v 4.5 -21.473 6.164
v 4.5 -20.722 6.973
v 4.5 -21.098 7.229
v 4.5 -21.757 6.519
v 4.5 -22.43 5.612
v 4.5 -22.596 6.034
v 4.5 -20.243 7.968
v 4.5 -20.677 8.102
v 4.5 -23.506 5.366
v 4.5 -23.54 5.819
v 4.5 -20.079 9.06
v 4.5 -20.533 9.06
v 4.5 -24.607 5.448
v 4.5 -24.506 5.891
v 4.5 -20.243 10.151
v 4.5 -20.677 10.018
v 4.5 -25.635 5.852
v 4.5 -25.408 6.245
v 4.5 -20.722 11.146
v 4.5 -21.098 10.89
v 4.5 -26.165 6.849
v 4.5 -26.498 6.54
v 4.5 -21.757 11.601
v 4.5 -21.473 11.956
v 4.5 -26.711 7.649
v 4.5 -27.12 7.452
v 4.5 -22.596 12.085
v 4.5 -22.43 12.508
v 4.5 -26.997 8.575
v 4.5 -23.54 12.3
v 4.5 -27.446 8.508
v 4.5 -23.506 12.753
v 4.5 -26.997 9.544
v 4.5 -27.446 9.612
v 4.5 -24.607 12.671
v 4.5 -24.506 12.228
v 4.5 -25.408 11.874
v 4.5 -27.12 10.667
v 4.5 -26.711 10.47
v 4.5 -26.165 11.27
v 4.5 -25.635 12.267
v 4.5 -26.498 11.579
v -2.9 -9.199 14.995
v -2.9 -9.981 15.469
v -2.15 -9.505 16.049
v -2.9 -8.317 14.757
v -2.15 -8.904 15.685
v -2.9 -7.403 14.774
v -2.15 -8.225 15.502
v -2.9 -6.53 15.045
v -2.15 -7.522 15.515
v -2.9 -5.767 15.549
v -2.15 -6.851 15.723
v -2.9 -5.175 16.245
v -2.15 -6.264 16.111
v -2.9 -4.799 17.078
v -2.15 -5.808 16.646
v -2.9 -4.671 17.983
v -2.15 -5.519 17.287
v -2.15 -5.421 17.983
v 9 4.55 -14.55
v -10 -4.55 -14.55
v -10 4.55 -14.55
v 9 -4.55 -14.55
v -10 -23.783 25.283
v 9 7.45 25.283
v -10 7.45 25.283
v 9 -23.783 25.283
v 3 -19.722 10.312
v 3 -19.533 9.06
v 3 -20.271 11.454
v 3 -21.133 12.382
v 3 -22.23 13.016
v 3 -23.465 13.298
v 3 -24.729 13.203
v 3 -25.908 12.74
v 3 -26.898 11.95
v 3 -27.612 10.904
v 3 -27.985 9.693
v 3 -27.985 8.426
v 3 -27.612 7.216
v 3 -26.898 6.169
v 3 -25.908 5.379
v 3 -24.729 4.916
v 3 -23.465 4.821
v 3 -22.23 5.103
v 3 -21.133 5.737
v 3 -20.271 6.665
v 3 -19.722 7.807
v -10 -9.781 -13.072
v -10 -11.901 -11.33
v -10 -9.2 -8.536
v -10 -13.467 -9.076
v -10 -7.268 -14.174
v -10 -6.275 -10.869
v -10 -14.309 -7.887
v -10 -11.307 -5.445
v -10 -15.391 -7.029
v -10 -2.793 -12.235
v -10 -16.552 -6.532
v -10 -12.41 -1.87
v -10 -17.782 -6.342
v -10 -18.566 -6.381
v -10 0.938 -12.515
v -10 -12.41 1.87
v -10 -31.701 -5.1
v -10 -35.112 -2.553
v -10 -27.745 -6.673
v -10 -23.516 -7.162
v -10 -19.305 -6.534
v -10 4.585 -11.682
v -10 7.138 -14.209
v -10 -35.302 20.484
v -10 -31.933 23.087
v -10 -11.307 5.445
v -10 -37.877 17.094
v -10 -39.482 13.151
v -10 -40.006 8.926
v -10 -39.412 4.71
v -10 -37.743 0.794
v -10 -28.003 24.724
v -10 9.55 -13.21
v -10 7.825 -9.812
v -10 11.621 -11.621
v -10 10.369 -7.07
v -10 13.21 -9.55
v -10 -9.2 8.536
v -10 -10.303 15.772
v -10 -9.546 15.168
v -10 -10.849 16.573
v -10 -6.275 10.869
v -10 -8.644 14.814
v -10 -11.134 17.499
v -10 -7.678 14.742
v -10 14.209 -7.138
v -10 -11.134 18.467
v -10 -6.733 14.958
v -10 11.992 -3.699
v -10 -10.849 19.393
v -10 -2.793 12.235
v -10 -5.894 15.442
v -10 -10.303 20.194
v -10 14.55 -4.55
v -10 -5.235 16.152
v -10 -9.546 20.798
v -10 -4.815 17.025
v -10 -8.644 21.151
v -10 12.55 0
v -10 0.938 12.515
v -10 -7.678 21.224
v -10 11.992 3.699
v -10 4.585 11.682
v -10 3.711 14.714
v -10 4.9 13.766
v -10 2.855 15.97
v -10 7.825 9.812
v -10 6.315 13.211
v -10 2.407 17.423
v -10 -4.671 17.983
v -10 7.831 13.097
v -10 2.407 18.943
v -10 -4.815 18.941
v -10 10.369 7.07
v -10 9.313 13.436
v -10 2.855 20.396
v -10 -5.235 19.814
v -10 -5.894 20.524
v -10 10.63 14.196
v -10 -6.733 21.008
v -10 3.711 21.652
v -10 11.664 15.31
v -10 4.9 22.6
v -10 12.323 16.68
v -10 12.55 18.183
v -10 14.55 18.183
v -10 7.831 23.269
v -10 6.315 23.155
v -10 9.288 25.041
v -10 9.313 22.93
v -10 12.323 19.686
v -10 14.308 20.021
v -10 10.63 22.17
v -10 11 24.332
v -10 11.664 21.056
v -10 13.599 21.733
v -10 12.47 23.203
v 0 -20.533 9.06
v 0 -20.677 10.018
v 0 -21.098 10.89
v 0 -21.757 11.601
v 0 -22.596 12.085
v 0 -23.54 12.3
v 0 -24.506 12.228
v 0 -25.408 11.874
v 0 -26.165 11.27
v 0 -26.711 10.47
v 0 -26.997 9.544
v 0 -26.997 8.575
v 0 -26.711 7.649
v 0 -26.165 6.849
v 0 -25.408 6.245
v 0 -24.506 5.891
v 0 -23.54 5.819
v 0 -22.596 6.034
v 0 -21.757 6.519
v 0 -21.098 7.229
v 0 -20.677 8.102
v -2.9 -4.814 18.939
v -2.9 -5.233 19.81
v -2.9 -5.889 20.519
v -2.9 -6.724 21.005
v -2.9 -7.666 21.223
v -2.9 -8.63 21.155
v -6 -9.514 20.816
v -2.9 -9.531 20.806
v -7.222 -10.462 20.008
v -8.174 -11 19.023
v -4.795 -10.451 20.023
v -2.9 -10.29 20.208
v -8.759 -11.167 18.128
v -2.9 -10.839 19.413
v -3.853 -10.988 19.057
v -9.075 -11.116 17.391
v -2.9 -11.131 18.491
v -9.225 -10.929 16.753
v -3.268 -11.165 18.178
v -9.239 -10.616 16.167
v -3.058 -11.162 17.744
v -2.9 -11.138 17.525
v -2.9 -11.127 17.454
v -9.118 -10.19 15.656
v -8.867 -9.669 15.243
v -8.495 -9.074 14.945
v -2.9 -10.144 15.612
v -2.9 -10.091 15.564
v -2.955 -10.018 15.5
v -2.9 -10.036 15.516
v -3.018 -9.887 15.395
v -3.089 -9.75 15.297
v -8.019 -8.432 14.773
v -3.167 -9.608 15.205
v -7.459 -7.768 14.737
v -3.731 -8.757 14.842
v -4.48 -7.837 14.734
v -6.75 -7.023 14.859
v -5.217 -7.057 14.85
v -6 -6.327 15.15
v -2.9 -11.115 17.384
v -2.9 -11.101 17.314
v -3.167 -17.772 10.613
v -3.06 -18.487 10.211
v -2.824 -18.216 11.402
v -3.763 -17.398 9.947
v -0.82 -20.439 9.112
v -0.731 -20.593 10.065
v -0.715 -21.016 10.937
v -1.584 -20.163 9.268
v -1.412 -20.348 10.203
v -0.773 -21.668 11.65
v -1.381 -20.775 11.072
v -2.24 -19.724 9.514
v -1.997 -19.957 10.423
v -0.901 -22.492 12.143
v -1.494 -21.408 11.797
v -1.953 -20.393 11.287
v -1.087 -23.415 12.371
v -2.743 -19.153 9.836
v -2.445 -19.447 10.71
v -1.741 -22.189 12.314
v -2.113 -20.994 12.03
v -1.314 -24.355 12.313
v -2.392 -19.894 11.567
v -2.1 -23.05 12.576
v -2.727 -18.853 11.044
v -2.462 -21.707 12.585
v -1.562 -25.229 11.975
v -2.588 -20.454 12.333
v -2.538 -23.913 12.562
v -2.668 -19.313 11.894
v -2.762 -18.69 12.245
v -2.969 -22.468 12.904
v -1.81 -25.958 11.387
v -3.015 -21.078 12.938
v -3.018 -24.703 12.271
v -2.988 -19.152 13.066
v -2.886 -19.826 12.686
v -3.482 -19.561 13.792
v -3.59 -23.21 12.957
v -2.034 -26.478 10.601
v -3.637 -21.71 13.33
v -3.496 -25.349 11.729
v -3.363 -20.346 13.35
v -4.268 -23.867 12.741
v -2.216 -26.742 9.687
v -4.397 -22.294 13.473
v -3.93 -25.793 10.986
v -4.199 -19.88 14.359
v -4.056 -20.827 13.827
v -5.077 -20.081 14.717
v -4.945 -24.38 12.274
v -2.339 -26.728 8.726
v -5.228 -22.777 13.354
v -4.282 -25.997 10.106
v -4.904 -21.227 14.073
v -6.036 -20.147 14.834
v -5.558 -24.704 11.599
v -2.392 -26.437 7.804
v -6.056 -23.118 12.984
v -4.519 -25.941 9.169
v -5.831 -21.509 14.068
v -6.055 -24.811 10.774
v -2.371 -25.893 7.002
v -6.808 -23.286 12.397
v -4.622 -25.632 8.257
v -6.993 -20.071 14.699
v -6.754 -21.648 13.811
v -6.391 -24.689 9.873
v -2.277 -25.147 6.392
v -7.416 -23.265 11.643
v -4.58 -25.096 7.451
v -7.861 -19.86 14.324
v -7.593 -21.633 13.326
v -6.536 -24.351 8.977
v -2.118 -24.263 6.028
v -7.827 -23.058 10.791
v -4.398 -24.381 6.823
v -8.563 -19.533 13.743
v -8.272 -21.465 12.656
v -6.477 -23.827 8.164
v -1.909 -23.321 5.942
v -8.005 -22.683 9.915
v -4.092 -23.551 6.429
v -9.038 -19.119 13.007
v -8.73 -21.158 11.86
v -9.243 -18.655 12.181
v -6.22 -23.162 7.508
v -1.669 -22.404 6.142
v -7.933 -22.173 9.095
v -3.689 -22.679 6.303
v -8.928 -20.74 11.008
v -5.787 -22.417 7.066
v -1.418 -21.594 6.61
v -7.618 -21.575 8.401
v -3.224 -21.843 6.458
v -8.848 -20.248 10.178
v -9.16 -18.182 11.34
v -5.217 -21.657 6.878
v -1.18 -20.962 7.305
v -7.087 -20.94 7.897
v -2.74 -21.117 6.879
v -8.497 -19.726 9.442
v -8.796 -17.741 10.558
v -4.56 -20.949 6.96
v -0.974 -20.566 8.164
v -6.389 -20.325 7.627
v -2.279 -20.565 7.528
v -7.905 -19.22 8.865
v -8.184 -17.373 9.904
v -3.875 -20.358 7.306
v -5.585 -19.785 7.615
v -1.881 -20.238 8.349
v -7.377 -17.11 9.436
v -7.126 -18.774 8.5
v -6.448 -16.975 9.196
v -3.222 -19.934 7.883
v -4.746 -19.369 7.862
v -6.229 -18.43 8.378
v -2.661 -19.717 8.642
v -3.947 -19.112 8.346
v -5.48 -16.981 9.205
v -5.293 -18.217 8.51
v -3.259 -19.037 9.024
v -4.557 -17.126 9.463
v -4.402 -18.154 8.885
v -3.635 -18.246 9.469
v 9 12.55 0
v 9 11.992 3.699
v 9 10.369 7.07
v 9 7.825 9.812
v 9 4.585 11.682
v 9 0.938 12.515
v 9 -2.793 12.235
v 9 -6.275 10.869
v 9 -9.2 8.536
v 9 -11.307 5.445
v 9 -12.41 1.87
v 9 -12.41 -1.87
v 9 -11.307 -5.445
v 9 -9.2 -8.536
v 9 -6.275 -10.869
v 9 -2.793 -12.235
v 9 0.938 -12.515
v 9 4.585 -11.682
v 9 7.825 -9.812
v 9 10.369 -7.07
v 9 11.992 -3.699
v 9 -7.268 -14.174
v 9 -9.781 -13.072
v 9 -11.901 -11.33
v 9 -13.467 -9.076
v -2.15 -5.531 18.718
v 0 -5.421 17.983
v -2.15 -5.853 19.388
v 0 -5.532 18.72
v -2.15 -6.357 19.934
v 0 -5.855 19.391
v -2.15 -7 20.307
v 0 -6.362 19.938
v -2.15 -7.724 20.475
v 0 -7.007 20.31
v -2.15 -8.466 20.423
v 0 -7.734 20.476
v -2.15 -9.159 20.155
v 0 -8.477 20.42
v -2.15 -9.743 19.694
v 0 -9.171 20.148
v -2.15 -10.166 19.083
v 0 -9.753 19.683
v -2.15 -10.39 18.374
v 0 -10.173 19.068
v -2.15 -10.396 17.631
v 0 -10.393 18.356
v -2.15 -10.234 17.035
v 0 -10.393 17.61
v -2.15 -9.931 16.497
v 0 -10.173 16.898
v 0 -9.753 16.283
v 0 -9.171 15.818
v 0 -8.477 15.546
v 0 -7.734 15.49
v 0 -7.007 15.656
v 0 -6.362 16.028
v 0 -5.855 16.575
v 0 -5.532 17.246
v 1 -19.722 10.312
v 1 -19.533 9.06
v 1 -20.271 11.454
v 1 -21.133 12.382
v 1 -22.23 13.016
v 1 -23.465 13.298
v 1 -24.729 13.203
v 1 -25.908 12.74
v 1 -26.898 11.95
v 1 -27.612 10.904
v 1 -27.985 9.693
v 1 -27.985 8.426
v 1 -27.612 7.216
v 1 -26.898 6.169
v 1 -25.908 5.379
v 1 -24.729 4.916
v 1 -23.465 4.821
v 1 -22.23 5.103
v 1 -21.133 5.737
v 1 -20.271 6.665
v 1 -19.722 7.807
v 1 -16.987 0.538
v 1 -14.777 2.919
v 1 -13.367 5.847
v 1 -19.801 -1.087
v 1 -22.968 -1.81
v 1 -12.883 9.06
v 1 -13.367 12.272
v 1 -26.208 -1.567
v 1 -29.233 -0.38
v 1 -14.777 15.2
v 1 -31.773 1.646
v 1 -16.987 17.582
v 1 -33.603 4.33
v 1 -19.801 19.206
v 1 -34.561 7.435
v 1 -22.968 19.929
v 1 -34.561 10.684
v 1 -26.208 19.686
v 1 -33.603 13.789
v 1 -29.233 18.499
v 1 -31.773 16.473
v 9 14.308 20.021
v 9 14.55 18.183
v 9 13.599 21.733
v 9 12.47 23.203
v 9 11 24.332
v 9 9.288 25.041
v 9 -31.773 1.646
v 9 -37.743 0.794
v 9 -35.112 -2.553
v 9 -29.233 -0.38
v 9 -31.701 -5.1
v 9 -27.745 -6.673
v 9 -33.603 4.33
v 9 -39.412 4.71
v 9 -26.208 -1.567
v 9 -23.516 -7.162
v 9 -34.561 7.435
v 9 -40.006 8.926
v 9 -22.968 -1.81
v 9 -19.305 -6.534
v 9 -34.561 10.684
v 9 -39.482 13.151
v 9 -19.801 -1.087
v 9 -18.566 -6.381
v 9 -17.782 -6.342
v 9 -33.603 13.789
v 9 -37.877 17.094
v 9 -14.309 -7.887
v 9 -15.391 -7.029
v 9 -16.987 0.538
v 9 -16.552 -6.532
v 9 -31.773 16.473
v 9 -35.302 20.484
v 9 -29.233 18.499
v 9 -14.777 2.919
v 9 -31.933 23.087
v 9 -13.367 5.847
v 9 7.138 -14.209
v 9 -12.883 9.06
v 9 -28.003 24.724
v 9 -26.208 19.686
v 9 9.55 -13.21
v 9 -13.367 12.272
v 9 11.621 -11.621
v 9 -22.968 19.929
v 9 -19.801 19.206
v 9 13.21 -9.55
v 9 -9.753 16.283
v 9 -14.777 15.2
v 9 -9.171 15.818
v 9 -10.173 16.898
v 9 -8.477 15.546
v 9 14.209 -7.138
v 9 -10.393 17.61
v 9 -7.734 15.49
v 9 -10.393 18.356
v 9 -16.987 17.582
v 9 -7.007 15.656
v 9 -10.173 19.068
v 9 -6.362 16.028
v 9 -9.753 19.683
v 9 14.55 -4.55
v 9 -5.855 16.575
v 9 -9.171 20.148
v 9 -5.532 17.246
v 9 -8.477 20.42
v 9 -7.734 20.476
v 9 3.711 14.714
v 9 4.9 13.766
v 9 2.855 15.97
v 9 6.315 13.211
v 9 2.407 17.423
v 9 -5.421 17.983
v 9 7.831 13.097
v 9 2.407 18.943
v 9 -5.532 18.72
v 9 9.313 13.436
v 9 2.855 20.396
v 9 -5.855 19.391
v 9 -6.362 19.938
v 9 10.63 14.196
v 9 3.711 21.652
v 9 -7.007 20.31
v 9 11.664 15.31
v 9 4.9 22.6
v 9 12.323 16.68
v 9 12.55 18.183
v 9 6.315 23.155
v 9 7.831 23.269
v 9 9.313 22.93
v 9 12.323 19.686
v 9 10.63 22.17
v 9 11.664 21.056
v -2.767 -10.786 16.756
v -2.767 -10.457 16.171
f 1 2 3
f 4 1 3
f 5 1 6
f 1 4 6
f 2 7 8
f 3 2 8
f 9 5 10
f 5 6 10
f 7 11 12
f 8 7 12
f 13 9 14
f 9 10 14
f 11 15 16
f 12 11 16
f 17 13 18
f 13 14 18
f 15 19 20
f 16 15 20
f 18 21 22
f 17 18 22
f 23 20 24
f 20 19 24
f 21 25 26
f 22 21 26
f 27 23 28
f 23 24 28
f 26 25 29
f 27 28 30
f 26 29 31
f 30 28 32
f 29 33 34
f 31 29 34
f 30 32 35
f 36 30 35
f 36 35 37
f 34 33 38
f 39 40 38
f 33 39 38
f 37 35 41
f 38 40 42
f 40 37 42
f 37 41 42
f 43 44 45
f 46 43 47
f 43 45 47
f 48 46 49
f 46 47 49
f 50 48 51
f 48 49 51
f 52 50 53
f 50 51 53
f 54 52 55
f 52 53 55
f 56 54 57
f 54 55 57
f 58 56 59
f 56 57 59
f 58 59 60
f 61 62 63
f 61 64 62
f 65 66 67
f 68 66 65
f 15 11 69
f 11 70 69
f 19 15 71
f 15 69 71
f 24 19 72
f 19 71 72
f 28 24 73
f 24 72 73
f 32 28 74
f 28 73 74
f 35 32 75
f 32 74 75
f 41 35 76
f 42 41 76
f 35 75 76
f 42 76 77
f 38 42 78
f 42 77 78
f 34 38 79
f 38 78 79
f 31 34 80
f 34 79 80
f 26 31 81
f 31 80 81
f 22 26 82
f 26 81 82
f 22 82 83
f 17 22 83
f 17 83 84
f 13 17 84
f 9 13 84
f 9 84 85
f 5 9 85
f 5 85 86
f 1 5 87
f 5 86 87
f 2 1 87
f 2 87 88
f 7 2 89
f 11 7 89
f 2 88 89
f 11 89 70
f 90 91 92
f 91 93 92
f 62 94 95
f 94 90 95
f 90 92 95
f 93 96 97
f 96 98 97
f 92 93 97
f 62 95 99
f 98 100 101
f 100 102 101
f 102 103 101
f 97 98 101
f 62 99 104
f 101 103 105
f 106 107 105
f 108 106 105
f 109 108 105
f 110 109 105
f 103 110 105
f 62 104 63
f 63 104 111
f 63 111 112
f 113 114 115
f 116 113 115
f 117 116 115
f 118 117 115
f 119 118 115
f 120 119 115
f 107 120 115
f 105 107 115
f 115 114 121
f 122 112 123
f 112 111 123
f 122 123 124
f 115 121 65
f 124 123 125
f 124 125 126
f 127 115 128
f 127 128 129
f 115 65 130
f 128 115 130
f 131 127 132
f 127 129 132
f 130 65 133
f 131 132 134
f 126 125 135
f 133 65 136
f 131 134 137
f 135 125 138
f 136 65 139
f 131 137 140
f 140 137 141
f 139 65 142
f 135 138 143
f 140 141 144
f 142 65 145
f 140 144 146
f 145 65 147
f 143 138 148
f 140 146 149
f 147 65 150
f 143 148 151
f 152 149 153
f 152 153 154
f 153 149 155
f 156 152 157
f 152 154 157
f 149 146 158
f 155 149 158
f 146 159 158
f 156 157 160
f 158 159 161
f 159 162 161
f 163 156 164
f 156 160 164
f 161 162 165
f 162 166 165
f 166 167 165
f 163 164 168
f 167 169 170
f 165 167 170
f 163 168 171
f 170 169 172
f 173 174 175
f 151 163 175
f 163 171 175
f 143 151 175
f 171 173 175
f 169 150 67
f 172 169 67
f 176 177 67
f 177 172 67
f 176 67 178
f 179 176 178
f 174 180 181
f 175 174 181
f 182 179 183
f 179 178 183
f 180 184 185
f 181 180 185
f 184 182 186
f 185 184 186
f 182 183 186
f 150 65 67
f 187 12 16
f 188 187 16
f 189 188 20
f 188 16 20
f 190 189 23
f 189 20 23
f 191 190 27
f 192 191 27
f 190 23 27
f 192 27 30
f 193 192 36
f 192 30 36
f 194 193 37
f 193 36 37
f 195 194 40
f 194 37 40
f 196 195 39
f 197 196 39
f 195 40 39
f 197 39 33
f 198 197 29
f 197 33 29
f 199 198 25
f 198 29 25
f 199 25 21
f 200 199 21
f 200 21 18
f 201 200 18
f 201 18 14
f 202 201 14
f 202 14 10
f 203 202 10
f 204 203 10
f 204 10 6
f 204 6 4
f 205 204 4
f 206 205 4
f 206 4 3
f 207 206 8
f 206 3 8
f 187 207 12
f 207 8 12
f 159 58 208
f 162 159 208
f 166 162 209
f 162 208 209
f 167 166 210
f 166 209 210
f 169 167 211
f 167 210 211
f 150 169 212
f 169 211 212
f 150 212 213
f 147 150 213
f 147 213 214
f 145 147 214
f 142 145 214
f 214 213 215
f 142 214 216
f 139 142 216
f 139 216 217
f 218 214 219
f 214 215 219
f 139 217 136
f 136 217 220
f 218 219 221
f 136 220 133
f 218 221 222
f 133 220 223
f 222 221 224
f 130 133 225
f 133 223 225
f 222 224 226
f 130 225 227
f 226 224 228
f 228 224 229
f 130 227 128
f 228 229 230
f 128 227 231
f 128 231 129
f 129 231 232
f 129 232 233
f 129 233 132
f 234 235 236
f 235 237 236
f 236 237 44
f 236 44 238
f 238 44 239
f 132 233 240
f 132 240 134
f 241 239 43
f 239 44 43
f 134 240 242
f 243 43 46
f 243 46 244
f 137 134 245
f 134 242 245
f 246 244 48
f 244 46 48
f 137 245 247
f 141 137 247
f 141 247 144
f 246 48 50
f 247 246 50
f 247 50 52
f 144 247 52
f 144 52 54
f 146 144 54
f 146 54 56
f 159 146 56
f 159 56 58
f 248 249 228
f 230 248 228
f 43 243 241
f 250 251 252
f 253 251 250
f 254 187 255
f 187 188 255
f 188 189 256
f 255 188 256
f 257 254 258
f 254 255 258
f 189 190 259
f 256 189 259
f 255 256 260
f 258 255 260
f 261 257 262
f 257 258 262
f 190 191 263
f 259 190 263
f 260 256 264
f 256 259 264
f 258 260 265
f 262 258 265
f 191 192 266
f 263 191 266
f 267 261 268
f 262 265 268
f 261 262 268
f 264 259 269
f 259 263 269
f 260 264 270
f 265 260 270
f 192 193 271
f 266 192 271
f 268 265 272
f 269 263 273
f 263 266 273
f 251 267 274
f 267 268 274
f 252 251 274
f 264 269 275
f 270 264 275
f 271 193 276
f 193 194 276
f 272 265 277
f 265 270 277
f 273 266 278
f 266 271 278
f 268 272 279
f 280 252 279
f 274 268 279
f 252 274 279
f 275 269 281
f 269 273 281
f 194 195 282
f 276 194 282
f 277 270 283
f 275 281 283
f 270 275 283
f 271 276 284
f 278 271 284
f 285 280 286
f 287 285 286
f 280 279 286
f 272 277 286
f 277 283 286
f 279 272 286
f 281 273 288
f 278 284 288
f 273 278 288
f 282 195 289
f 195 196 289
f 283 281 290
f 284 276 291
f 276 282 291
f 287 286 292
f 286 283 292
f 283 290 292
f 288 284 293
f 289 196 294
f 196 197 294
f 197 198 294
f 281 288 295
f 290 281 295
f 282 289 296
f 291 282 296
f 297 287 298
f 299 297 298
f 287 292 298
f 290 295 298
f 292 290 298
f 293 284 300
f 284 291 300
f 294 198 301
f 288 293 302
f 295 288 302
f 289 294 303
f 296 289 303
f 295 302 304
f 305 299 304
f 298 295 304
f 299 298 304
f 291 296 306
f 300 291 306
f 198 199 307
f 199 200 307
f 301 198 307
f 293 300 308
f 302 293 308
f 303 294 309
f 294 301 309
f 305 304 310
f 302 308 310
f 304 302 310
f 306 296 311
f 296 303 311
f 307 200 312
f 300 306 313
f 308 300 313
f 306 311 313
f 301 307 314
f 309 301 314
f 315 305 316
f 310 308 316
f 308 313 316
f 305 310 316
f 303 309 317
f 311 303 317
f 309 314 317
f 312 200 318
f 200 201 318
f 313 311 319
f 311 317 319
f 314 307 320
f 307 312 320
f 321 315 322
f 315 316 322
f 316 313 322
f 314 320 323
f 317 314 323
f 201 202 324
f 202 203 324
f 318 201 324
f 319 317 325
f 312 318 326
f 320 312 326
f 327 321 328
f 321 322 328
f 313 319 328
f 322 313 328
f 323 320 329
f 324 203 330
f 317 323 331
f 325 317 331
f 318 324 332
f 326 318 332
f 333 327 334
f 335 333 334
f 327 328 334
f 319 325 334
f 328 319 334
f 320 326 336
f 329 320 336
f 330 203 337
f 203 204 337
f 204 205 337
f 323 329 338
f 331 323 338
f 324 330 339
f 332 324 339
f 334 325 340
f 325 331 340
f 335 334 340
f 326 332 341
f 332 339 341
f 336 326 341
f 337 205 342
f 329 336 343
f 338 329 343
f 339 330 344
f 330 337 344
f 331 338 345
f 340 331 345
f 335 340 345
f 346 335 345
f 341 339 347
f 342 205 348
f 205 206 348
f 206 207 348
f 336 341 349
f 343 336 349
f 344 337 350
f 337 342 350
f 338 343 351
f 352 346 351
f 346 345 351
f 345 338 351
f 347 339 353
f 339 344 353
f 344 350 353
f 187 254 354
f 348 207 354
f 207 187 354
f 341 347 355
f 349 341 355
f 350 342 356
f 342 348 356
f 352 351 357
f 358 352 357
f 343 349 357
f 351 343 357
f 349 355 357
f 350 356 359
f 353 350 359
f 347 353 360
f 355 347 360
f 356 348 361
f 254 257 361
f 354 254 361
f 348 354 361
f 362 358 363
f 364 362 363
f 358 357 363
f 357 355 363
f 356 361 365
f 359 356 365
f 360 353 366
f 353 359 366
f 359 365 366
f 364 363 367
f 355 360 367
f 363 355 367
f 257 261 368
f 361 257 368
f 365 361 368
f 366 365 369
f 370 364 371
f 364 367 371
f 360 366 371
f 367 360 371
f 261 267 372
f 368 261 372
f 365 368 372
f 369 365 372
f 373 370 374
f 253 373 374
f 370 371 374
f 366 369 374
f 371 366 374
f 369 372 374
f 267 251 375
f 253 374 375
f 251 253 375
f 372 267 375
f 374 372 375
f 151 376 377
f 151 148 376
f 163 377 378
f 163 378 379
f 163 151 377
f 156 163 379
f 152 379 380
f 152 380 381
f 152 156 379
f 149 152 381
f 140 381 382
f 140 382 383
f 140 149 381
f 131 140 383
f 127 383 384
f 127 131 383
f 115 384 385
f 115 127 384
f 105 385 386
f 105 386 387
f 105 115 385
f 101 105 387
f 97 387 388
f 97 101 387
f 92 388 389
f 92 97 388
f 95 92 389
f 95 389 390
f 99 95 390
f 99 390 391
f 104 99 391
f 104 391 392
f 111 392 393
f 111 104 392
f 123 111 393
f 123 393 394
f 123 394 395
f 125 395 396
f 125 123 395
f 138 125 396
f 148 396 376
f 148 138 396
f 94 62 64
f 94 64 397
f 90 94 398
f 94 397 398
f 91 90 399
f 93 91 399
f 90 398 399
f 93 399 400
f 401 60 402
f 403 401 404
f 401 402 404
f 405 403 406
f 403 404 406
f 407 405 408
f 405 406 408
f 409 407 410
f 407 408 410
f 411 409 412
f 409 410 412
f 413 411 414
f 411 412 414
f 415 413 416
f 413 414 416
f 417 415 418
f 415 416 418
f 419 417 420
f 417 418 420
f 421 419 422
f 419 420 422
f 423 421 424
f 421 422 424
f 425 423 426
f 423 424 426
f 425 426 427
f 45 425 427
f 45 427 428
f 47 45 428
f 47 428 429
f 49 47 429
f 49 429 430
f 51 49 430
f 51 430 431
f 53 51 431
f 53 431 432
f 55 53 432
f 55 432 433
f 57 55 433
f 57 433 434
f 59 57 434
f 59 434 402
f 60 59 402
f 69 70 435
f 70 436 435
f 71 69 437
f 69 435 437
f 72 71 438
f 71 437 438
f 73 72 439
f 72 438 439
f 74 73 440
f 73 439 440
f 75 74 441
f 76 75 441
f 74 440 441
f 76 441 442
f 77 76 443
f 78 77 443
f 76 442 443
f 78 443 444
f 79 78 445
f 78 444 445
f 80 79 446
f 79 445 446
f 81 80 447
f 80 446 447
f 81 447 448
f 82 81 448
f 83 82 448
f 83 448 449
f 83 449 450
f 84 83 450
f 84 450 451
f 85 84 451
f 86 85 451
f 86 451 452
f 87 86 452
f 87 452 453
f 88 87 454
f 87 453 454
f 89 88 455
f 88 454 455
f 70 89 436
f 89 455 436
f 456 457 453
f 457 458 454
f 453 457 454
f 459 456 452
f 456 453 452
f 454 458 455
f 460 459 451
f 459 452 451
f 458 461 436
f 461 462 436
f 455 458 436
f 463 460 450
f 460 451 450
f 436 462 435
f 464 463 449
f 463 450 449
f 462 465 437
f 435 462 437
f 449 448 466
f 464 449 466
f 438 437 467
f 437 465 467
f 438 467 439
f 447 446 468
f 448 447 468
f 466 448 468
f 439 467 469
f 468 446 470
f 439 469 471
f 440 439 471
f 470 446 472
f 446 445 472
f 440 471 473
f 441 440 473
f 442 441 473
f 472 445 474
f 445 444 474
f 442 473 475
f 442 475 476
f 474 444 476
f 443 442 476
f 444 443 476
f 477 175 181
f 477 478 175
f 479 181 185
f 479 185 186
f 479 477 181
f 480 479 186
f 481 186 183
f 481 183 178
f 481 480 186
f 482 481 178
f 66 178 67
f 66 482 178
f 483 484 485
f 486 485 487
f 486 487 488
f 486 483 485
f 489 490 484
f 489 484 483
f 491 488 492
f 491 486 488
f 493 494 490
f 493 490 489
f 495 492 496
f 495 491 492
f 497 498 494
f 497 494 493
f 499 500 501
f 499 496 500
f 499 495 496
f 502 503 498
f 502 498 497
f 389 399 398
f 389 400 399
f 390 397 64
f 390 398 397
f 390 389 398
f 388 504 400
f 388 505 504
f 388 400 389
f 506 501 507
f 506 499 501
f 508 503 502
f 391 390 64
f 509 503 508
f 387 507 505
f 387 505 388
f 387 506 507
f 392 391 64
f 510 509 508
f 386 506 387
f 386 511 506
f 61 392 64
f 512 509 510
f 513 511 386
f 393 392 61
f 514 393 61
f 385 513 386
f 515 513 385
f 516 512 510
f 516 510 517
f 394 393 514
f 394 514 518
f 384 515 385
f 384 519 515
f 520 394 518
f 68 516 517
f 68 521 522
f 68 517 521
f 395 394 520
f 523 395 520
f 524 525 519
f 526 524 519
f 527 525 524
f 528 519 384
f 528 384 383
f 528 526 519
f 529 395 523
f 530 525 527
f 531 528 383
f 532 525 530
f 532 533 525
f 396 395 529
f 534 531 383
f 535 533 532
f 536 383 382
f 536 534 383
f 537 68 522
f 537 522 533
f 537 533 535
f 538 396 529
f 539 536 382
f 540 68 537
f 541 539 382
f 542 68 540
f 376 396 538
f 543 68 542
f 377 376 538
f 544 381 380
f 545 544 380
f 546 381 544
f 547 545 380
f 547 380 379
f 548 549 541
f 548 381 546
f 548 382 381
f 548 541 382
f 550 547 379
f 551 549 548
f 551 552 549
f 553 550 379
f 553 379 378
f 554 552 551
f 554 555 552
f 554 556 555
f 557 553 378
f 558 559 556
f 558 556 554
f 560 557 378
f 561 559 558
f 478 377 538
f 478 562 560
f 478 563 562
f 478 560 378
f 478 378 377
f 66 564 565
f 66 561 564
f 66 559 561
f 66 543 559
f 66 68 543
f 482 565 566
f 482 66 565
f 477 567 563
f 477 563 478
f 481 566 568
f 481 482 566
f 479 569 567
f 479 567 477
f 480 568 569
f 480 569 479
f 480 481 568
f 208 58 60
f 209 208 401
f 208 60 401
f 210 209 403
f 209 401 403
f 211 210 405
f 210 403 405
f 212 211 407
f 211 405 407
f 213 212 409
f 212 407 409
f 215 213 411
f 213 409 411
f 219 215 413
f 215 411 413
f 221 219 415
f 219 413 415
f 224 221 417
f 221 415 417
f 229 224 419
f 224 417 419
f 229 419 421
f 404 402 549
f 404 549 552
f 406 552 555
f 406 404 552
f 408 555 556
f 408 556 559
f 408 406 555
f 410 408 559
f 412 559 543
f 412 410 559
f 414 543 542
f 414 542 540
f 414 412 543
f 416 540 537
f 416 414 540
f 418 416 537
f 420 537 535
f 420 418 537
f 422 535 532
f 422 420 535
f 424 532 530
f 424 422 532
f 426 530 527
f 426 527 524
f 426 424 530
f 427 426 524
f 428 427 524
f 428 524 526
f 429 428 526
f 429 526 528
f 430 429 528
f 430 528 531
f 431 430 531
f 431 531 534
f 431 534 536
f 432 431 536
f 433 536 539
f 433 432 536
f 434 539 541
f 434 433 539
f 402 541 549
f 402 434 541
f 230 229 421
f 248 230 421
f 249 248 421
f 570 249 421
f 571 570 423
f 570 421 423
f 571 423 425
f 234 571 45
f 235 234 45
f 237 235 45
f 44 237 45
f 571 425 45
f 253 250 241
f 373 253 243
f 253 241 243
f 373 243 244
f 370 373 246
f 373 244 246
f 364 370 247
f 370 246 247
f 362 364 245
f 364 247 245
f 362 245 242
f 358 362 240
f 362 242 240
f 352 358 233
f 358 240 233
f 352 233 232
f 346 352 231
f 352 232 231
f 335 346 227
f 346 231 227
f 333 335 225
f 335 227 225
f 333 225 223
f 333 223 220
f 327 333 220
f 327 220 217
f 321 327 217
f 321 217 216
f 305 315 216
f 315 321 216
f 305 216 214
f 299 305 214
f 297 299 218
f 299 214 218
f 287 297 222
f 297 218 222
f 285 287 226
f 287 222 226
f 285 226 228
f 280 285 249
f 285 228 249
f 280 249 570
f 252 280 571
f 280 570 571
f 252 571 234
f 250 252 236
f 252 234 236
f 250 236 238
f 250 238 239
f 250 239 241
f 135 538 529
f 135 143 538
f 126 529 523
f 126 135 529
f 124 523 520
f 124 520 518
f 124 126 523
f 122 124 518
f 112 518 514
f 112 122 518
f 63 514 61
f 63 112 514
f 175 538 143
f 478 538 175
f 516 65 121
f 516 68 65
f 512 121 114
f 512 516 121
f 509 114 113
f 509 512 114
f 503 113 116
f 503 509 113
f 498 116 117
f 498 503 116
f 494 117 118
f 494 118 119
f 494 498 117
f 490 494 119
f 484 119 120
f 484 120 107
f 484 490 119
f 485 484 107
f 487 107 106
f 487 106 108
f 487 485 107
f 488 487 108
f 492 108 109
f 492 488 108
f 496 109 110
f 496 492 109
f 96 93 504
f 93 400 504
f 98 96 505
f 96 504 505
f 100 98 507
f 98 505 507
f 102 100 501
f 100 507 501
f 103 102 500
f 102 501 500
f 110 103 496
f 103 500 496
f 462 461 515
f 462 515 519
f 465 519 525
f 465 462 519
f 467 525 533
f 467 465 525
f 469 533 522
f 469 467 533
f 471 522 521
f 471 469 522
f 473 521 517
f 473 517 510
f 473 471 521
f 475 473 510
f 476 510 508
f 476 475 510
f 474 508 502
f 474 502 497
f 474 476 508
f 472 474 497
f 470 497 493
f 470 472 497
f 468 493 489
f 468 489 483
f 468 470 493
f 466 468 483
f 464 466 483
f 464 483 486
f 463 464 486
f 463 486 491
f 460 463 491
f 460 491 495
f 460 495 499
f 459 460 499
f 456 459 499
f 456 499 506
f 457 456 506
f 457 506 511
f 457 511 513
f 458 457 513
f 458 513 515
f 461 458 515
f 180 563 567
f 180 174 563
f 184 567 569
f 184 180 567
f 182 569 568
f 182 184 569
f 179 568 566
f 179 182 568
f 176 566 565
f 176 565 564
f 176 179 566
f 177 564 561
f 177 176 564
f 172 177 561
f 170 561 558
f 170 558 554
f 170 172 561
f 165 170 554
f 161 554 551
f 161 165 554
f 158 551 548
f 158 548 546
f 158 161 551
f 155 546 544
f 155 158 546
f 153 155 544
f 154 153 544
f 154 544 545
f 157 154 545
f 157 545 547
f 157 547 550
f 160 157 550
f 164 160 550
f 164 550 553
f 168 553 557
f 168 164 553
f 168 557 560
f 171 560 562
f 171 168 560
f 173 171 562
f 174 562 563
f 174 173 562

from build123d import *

# Parameters (mm, degrees)
F0_R          = 12.55
F0_R_2        = 10.9
F0_R_3        = 3.25
F0_R_4        = 5.1
F0_R_5        = 2.5
F1_DEPTH      = 9
F2_DEPTH      = 10
F3_R          = 10
F4_R          = 5
F11_DEPTH     = 2.9
F10_R         = 3.25
F13_T4_ANGLE  = 230.6618088311
F13_S5_R      = 3.25
F13_T6_DEPTH  = 6
F13_T10_ANGLE = 171.9012593912
F13_S11_R     = 3.25
F13_T12_DEPTH = 5


# Not quite as in the source:
# - a fillet or chamfer that OpenCascade refuses, or shapes differently, is made with other operations: its cross-section is extruded or revolved along the edge and cut away or added


with BuildPart() as f1:
    # F0 (on Right) → F1 (new body)
    with BuildSketch(Plane.YZ):
        with BuildLine():
            Line((7.45, 25.2829590551), (-23.7829060836, 25.2829590551))
            ThreePointArc((-23.7829060836, 25.2829590551), (-39.2686382031, 4.2232189691), (-14.55, -4.280278967))
            Line((-14.55, -4.280278967), (-14.55, -14.55))
            Line((-14.55, -14.55), (14.55, -14.55))
            Line((14.55, -14.55), (14.55, 18.1829590551))
            ThreePointArc((14.55, 18.1829590551), (12.4704581464, 23.2034172015), (7.45, 25.2829590551))
        make_face()
        Circle(F0_R, mode=Mode.SUBTRACT)
        with Locations((-23.7829060836, 9.059573843)):
            Circle(F0_R_2, mode=Mode.SUBTRACT)
        with Locations((-7.9205860656, 17.9829590551)):
            Circle(F0_R_3, mode=Mode.SUBTRACT)
        with Locations((7.45, 18.1829590551)):
            Circle(F0_R_4, mode=Mode.SUBTRACT)
        with Locations((-7.9205860656, 17.9829590551)):
            Circle(F0_R_3)
        with Locations((-7.9205860656, 17.9829590551)):
            Circle(F0_R_5, mode=Mode.SUBTRACT)
    extrude(amount=F1_DEPTH)

    # F0 (on Right) → F2 (join)
    with BuildSketch(Plane.YZ):
        with BuildLine():
            Line((7.45, 25.2829590551), (-23.7829060836, 25.2829590551))
            ThreePointArc((-23.7829060836, 25.2829590551), (-39.2686382031, 4.2232189691), (-14.55, -4.280278967))
            Line((-14.55, -4.280278967), (-14.55, -14.55))
            Line((-14.55, -14.55), (14.55, -14.55))
            Line((14.55, -14.55), (14.55, 18.1829590551))
            ThreePointArc((14.55, 18.1829590551), (12.4704581464, 23.2034172015), (7.45, 25.2829590551))
        make_face()
        Circle(F0_R, mode=Mode.SUBTRACT)
        with Locations((-23.7829060836, 9.059573843)):
            Circle(F0_R_2, mode=Mode.SUBTRACT)
        with Locations((-7.9205860656, 17.9829590551)):
            Circle(F0_R_3, mode=Mode.SUBTRACT)
        with Locations((7.45, 18.1829590551)):
            Circle(F0_R_4, mode=Mode.SUBTRACT)
        with Locations((-23.7829060836, 9.059573843)):
            Circle(F0_R_2)
    extrude(amount=-F2_DEPTH)

    # F3
    f3_edges = [f1.edges().sort_by_distance(p)[0] for p in [
        (-0.5, -23.782906, 25.282959),
        (-0.5, 14.55, 18.182959),
        (-0.5, 7.45, 25.282959),
        (-0.5, -14.55, -14.55),
        (-0.5, 14.55, -14.55),
    ]]
    fillet(f3_edges, radius=F3_R)

    # F4
    f4_edges = [f1.edges().sort_by_distance(p)[0] for p in [
        (-0.5, -14.55, -4.280279),
    ]]
    fillet(f4_edges, radius=F4_R)

    # F7 (on plane+point) → F8 (revolve)
    with BuildSketch(Plane.XY.offset(9.059573843)):
        Polygon((1, -12.7829060836), (0, -12.7829060836), (0, -20.5329060836), (4.5, -20.5329060836), (4.5, -20.078861435), (3, -19.5329060836), (1, -19.5329060836), align=None)
    revolve(axis=Axis((4.5, -23.7829060836, 9.059573843), (1, 0, 0)))

    # F0 (on Right) → F11 (join)
    with BuildSketch(Plane.YZ):
        with Locations((-7.9205860656, 17.9829590551)):
            Circle(F0_R_3)
        with Locations((-7.9205860656, 17.9829590551)):
            Circle(F0_R_5, mode=Mode.SUBTRACT)
    extrude(amount=-F11_DEPTH)

    # F12: sweep along a path in F9
    with BuildLine(Plane(origin=(0, -9.5885144747, 17.044662029), x_dir=(1, 0, 0), z_dir=(0, 0.4902958908, -0.8715560449))) as f12_path:
        ThreePointArc((0, 16.2862637363), (-4.2426406871, 14.5289044234), (-6, 10.2862637363))
        Line((-6, 10.2862637363), (-6, -1.9137362637))
    # F10 (on face) → F12 (sweep, cut)
    with BuildSketch(Plane.YZ):
        with Locations((-23.7829060836, 9.059573843)):
            Circle(F10_R)
    sweep(path=f12_path.line, mode=Mode.SUBTRACT)

    # F13: chamfer of 0.75 on 1 edges, made by hand


with BuildPart() as f13_tool2:
    # F13_s3 → F13_t4 (revolve)
    with BuildSketch(Plane.XY.offset(17.9829590551)):
        Polygon((-2.9, -4.6705860656), (-2.15, -5.4205860656), (-2.9, -5.4205860656), align=None)
    revolve(axis=Axis((-2.9, -7.9205860656, 17.9829590551), (1, 0, 0)), revolution_arc=F13_T4_ANGLE)

    # F13_s5 → F13_t6 (intersect, symmetric)
    with BuildSketch(Plane.YZ.offset(-2.5)):
        with Locations((-7.9205860656, 17.9829590551)):
            Circle(F13_S5_R)
    extrude(amount=F13_T6_DEPTH, both=True, mode=Mode.INTERSECT)


with BuildPart() as f1_1:
    add(f1.part)

    # F13_t1: cut F13_tool2
    add(f13_tool2.part, mode=Mode.SUBTRACT)


with BuildPart() as f13_tool8:
    # F13_s9 → F13_t10 (revolve)
    with BuildSketch(Plane(origin=(0, -2.6653633076, 18.7307701592), x_dir=(1, 0, 0), z_dir=(0, -0.1408794707, 0.9900267546))):
        Polygon((-2.9, -8.558162364), (-2.15, -7.808162364), (-2.9, -7.808162364), align=None)
    revolve(axis=Axis((-2.9, -7.9205860656, 17.9829590551), (1, 0, 0)), revolution_arc=F13_T10_ANGLE)

    # F13_s11 → F13_t12 (intersect, symmetric)
    with BuildSketch(Plane.YZ.offset(-2.5)):
        with Locations((-7.9205860656, 17.9829590551)):
            Circle(F13_S11_R)
    extrude(amount=F13_T12_DEPTH, both=True, mode=Mode.INTERSECT)


with BuildPart() as f1_2:
    add(f1_1.part)

    # F13_t7: cut F13_tool8
    add(f13_tool8.part, mode=Mode.SUBTRACT)


solid = f1_2.part
